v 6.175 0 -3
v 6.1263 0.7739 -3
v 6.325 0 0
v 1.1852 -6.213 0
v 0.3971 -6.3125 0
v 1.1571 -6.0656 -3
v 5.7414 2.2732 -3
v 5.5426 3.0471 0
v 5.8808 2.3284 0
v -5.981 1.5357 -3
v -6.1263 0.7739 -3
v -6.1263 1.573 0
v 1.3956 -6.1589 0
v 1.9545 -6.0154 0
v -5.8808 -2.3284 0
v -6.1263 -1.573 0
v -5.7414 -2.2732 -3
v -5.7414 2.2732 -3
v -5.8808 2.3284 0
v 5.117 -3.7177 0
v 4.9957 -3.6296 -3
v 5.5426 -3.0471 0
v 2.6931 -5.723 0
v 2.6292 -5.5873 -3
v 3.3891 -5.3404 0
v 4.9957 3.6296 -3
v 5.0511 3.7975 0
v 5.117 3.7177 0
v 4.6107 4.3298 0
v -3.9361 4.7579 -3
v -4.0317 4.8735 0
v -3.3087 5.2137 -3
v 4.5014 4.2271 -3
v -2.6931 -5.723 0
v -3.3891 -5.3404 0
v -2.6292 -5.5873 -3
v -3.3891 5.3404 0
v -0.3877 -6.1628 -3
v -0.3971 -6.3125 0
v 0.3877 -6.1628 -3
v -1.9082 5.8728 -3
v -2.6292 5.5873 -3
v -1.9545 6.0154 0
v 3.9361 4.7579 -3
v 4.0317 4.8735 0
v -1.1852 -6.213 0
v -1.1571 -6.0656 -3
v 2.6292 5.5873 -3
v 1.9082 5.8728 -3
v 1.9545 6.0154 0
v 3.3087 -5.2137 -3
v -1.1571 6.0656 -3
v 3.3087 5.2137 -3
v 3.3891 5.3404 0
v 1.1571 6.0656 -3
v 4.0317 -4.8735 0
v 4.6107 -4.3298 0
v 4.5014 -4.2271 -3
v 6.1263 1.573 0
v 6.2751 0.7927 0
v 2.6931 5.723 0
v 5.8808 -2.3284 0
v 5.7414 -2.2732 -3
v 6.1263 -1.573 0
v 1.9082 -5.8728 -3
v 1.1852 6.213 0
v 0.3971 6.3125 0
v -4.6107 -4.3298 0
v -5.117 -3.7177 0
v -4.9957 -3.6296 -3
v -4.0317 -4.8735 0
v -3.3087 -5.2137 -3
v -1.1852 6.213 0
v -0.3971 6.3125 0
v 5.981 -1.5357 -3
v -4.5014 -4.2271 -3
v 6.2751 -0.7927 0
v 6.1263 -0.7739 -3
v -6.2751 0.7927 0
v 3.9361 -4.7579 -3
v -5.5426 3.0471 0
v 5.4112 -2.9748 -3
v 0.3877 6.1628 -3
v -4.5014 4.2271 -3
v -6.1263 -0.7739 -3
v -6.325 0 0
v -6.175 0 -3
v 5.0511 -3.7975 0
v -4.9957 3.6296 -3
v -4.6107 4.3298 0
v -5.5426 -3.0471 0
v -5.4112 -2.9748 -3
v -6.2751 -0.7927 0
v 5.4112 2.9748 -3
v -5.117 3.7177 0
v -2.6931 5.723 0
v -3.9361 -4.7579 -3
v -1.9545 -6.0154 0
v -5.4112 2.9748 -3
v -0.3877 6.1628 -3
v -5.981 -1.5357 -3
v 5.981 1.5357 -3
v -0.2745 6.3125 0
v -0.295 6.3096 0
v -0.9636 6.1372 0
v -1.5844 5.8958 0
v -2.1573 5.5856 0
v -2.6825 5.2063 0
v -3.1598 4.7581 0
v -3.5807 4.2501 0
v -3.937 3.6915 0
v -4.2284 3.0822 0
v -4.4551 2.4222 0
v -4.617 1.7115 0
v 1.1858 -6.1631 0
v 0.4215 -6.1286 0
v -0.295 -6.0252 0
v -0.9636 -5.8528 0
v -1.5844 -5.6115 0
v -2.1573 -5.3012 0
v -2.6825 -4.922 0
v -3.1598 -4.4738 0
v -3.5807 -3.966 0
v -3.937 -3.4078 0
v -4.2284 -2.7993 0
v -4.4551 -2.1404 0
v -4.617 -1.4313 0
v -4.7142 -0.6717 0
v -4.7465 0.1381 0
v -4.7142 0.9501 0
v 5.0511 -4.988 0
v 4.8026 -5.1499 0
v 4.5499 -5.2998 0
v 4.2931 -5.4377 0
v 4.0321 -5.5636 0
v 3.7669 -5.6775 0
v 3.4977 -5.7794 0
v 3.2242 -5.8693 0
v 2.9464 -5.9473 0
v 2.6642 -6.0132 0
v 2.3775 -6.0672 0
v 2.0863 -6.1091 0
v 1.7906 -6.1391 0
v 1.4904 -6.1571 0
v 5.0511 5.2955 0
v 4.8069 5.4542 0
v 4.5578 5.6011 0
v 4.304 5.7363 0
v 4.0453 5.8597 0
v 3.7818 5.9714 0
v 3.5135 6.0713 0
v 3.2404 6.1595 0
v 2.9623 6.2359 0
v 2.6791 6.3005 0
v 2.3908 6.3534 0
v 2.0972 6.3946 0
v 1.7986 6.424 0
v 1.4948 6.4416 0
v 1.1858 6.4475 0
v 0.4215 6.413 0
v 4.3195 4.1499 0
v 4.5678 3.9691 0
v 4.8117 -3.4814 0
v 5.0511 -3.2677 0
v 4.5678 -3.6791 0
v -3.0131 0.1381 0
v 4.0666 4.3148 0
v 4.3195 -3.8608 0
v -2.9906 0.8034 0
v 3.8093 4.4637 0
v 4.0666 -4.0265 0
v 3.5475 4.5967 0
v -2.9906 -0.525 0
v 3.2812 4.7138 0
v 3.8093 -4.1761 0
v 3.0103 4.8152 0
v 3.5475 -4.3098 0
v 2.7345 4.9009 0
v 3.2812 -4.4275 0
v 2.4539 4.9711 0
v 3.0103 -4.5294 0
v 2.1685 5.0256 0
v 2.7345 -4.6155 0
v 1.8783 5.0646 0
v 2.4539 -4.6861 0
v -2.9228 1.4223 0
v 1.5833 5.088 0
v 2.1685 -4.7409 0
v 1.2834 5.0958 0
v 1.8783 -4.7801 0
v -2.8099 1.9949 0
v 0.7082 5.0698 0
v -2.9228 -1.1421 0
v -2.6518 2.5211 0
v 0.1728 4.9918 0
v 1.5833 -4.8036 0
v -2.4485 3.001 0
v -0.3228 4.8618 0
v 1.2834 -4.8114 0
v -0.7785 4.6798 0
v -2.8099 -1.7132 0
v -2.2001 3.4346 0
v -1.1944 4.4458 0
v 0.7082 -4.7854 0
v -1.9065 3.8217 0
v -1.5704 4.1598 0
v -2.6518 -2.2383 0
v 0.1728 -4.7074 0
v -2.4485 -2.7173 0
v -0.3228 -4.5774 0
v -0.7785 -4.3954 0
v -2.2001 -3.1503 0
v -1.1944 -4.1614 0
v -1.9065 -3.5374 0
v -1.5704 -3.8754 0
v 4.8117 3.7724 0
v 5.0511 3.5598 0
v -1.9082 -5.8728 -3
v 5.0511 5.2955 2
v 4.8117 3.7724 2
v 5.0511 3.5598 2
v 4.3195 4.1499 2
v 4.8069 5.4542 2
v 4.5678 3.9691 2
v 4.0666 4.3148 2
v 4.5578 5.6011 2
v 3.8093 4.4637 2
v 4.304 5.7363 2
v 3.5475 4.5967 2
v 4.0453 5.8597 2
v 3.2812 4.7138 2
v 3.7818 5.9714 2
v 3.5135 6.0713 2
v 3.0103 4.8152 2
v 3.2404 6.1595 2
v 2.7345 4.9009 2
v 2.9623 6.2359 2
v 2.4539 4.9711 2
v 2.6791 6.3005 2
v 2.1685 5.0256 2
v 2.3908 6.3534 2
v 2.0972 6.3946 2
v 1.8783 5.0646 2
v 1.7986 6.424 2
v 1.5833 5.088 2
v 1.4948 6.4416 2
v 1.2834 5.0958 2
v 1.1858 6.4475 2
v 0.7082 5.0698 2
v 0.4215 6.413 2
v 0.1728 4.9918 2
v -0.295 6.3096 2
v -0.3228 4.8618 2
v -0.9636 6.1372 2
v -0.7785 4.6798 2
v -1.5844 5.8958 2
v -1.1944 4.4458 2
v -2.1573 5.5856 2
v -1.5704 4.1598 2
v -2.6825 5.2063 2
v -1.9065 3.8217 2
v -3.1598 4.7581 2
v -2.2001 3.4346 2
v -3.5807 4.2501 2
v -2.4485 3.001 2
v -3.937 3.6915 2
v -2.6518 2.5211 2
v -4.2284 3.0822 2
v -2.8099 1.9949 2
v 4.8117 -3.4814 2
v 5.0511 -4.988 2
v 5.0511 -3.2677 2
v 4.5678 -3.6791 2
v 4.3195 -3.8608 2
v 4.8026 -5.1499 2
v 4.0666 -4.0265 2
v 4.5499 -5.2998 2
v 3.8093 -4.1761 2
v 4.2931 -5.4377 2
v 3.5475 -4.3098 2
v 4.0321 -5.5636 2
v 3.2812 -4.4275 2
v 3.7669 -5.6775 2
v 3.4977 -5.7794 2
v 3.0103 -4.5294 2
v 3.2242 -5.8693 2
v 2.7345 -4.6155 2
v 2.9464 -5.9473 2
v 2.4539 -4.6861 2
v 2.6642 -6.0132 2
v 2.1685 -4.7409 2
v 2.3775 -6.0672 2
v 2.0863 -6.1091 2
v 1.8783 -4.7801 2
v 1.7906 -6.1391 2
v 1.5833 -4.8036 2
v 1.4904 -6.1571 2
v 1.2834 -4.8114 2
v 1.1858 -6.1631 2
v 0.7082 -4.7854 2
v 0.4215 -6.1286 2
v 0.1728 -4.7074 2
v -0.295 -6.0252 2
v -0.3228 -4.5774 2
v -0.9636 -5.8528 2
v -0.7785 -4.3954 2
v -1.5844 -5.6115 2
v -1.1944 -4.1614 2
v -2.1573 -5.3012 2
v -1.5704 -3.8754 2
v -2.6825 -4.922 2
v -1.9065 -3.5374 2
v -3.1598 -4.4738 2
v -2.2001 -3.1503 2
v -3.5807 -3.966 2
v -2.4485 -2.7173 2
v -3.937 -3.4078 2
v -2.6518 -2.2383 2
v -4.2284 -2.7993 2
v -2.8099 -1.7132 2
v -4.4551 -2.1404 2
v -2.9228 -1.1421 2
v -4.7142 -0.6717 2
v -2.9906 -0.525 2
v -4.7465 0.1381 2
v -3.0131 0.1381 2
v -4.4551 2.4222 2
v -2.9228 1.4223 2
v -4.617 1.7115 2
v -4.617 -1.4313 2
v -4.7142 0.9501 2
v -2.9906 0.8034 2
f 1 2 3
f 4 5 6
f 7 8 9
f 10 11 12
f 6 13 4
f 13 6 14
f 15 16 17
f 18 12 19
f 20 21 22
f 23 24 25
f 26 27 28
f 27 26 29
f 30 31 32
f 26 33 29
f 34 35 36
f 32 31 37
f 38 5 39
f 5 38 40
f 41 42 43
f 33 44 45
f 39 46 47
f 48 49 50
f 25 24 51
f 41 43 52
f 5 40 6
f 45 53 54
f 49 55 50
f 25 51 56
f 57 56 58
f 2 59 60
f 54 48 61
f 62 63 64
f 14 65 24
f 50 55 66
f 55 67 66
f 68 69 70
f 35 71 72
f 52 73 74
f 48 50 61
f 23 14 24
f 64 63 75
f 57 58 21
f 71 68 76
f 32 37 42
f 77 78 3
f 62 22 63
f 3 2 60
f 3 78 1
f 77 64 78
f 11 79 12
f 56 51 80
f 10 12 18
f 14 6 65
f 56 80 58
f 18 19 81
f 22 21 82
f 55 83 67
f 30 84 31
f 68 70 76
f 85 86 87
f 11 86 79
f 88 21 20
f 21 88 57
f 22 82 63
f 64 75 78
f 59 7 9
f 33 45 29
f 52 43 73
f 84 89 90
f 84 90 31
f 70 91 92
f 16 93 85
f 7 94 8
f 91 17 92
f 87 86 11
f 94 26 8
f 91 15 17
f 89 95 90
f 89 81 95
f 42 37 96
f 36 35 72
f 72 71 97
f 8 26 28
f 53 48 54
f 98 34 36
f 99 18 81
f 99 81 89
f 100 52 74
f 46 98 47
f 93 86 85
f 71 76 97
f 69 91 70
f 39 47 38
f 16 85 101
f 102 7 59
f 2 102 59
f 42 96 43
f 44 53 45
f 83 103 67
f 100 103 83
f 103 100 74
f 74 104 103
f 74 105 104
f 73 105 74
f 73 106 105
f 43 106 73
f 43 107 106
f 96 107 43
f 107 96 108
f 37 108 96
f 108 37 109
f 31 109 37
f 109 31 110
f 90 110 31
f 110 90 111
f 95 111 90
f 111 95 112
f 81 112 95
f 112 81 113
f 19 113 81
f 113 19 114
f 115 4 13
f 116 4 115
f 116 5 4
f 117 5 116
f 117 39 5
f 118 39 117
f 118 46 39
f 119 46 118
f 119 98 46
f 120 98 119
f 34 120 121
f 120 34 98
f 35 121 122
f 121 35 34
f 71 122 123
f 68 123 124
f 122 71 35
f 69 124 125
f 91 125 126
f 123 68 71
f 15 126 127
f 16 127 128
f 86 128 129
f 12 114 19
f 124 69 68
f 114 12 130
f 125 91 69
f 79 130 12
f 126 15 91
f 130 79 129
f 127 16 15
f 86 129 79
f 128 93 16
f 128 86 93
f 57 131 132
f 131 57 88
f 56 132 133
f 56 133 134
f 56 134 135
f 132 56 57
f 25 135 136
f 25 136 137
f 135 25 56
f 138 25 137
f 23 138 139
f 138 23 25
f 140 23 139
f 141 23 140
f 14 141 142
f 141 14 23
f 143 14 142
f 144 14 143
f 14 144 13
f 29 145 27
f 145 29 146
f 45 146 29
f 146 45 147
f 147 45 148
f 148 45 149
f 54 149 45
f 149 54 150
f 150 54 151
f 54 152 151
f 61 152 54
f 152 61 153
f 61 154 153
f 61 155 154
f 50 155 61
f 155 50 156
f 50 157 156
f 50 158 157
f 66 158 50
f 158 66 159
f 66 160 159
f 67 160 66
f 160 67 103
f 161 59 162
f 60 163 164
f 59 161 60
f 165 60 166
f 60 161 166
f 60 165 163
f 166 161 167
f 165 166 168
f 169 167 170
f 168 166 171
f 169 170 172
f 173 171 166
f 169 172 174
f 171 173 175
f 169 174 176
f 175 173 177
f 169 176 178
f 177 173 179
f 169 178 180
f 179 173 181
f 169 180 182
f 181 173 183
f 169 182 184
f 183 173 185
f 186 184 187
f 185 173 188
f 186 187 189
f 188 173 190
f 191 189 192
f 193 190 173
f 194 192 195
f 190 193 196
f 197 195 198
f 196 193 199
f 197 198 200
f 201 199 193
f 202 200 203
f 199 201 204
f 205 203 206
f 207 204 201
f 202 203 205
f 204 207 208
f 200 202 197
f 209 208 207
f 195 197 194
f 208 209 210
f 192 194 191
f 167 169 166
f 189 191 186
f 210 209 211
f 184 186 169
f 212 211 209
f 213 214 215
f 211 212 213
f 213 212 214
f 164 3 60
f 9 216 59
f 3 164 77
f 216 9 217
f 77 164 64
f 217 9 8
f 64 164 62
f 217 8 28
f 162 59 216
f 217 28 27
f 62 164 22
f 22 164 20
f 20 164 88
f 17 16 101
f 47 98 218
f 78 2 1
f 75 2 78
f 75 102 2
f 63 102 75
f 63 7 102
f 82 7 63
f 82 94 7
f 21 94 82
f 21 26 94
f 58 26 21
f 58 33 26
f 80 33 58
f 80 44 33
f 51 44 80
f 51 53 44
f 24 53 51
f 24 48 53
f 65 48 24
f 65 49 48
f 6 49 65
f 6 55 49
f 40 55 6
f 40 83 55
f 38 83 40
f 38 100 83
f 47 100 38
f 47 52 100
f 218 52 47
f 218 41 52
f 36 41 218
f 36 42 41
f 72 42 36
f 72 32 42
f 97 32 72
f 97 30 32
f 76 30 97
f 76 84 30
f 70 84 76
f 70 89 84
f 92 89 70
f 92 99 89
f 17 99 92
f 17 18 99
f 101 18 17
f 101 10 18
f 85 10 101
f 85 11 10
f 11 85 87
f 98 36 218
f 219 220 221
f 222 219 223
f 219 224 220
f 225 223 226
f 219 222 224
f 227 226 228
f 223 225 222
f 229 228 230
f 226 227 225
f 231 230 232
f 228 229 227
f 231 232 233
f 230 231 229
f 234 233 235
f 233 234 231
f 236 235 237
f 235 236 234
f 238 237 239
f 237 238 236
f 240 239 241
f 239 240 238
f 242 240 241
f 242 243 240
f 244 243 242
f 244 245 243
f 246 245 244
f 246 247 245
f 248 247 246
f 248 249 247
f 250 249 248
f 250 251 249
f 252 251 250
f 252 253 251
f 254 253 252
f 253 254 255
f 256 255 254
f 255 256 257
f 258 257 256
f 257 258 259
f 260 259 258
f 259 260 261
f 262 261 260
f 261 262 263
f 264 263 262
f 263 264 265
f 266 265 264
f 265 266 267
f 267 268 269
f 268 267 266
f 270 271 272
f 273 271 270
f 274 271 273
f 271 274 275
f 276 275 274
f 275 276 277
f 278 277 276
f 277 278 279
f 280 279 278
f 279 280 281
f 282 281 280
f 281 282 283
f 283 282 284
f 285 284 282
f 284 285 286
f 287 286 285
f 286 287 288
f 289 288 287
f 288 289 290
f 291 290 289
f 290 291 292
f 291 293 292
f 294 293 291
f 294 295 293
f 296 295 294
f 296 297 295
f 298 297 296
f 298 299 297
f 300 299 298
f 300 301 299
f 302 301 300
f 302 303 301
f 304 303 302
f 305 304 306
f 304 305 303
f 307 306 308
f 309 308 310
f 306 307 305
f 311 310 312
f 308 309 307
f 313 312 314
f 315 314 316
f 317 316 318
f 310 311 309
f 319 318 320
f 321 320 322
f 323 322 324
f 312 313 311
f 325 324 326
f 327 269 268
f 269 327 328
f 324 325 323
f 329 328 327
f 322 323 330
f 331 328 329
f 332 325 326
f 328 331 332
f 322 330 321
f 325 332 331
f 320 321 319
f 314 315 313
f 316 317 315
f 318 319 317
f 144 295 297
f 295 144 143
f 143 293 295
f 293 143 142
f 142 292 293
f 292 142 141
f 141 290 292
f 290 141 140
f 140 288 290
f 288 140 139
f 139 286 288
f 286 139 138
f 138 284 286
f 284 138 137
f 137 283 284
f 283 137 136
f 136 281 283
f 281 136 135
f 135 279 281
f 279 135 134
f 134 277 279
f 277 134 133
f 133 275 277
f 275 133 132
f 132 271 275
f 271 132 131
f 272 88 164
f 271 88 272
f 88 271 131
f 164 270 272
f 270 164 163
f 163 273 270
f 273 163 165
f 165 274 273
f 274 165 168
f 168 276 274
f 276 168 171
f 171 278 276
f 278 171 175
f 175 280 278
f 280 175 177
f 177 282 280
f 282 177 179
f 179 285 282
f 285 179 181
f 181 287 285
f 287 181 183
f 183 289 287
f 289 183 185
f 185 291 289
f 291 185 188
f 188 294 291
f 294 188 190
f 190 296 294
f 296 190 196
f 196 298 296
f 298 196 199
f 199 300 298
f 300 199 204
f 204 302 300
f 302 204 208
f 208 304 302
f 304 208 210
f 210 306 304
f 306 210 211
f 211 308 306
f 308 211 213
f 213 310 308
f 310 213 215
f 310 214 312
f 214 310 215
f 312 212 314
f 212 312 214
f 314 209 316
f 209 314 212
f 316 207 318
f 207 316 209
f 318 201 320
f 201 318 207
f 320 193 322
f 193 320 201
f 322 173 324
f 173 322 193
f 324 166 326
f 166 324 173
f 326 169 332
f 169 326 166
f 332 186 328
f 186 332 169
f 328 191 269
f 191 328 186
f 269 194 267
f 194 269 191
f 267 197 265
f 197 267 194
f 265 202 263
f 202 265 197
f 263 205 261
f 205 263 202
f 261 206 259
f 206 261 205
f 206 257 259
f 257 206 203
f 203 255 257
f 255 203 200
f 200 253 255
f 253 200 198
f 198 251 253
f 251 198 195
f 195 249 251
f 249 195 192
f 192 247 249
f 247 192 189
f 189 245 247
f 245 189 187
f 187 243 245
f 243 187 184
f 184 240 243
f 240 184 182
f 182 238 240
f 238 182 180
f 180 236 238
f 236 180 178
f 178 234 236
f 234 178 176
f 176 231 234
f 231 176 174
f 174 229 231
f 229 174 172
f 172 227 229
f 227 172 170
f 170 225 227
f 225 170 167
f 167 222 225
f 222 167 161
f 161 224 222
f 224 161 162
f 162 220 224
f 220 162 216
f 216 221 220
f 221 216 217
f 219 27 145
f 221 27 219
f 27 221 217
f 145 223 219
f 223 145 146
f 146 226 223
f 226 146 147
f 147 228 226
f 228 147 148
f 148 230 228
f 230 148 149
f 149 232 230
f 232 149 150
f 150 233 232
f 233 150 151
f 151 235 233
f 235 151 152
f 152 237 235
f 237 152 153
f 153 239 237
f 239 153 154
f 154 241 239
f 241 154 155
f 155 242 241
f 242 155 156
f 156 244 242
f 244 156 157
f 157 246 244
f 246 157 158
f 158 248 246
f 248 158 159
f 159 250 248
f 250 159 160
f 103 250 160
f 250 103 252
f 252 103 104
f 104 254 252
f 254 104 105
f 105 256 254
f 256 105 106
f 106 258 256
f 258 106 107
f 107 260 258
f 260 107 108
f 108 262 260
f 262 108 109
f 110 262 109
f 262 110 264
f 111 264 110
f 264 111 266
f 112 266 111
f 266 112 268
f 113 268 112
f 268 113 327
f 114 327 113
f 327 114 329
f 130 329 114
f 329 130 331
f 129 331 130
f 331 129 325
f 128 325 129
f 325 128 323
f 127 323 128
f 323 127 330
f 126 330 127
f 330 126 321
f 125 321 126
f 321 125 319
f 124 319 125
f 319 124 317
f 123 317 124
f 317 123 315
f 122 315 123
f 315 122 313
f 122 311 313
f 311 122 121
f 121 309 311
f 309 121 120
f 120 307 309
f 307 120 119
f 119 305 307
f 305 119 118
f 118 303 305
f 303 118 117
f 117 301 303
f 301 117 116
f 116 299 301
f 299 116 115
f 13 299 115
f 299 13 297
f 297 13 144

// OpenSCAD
$fn = 50;


difference() {
	union() {
		translate(v = [0, 0, -3.0000000000]) {
			cylinder(h = 3, r1 = 6.1750000000, r2 = 6.3250000000);
		}
		linear_extrude(height = 2) {
			text(font = "Impact", halign = "center", size = 12, text = "C", valign = "center");
		}
	}
	union();
}
